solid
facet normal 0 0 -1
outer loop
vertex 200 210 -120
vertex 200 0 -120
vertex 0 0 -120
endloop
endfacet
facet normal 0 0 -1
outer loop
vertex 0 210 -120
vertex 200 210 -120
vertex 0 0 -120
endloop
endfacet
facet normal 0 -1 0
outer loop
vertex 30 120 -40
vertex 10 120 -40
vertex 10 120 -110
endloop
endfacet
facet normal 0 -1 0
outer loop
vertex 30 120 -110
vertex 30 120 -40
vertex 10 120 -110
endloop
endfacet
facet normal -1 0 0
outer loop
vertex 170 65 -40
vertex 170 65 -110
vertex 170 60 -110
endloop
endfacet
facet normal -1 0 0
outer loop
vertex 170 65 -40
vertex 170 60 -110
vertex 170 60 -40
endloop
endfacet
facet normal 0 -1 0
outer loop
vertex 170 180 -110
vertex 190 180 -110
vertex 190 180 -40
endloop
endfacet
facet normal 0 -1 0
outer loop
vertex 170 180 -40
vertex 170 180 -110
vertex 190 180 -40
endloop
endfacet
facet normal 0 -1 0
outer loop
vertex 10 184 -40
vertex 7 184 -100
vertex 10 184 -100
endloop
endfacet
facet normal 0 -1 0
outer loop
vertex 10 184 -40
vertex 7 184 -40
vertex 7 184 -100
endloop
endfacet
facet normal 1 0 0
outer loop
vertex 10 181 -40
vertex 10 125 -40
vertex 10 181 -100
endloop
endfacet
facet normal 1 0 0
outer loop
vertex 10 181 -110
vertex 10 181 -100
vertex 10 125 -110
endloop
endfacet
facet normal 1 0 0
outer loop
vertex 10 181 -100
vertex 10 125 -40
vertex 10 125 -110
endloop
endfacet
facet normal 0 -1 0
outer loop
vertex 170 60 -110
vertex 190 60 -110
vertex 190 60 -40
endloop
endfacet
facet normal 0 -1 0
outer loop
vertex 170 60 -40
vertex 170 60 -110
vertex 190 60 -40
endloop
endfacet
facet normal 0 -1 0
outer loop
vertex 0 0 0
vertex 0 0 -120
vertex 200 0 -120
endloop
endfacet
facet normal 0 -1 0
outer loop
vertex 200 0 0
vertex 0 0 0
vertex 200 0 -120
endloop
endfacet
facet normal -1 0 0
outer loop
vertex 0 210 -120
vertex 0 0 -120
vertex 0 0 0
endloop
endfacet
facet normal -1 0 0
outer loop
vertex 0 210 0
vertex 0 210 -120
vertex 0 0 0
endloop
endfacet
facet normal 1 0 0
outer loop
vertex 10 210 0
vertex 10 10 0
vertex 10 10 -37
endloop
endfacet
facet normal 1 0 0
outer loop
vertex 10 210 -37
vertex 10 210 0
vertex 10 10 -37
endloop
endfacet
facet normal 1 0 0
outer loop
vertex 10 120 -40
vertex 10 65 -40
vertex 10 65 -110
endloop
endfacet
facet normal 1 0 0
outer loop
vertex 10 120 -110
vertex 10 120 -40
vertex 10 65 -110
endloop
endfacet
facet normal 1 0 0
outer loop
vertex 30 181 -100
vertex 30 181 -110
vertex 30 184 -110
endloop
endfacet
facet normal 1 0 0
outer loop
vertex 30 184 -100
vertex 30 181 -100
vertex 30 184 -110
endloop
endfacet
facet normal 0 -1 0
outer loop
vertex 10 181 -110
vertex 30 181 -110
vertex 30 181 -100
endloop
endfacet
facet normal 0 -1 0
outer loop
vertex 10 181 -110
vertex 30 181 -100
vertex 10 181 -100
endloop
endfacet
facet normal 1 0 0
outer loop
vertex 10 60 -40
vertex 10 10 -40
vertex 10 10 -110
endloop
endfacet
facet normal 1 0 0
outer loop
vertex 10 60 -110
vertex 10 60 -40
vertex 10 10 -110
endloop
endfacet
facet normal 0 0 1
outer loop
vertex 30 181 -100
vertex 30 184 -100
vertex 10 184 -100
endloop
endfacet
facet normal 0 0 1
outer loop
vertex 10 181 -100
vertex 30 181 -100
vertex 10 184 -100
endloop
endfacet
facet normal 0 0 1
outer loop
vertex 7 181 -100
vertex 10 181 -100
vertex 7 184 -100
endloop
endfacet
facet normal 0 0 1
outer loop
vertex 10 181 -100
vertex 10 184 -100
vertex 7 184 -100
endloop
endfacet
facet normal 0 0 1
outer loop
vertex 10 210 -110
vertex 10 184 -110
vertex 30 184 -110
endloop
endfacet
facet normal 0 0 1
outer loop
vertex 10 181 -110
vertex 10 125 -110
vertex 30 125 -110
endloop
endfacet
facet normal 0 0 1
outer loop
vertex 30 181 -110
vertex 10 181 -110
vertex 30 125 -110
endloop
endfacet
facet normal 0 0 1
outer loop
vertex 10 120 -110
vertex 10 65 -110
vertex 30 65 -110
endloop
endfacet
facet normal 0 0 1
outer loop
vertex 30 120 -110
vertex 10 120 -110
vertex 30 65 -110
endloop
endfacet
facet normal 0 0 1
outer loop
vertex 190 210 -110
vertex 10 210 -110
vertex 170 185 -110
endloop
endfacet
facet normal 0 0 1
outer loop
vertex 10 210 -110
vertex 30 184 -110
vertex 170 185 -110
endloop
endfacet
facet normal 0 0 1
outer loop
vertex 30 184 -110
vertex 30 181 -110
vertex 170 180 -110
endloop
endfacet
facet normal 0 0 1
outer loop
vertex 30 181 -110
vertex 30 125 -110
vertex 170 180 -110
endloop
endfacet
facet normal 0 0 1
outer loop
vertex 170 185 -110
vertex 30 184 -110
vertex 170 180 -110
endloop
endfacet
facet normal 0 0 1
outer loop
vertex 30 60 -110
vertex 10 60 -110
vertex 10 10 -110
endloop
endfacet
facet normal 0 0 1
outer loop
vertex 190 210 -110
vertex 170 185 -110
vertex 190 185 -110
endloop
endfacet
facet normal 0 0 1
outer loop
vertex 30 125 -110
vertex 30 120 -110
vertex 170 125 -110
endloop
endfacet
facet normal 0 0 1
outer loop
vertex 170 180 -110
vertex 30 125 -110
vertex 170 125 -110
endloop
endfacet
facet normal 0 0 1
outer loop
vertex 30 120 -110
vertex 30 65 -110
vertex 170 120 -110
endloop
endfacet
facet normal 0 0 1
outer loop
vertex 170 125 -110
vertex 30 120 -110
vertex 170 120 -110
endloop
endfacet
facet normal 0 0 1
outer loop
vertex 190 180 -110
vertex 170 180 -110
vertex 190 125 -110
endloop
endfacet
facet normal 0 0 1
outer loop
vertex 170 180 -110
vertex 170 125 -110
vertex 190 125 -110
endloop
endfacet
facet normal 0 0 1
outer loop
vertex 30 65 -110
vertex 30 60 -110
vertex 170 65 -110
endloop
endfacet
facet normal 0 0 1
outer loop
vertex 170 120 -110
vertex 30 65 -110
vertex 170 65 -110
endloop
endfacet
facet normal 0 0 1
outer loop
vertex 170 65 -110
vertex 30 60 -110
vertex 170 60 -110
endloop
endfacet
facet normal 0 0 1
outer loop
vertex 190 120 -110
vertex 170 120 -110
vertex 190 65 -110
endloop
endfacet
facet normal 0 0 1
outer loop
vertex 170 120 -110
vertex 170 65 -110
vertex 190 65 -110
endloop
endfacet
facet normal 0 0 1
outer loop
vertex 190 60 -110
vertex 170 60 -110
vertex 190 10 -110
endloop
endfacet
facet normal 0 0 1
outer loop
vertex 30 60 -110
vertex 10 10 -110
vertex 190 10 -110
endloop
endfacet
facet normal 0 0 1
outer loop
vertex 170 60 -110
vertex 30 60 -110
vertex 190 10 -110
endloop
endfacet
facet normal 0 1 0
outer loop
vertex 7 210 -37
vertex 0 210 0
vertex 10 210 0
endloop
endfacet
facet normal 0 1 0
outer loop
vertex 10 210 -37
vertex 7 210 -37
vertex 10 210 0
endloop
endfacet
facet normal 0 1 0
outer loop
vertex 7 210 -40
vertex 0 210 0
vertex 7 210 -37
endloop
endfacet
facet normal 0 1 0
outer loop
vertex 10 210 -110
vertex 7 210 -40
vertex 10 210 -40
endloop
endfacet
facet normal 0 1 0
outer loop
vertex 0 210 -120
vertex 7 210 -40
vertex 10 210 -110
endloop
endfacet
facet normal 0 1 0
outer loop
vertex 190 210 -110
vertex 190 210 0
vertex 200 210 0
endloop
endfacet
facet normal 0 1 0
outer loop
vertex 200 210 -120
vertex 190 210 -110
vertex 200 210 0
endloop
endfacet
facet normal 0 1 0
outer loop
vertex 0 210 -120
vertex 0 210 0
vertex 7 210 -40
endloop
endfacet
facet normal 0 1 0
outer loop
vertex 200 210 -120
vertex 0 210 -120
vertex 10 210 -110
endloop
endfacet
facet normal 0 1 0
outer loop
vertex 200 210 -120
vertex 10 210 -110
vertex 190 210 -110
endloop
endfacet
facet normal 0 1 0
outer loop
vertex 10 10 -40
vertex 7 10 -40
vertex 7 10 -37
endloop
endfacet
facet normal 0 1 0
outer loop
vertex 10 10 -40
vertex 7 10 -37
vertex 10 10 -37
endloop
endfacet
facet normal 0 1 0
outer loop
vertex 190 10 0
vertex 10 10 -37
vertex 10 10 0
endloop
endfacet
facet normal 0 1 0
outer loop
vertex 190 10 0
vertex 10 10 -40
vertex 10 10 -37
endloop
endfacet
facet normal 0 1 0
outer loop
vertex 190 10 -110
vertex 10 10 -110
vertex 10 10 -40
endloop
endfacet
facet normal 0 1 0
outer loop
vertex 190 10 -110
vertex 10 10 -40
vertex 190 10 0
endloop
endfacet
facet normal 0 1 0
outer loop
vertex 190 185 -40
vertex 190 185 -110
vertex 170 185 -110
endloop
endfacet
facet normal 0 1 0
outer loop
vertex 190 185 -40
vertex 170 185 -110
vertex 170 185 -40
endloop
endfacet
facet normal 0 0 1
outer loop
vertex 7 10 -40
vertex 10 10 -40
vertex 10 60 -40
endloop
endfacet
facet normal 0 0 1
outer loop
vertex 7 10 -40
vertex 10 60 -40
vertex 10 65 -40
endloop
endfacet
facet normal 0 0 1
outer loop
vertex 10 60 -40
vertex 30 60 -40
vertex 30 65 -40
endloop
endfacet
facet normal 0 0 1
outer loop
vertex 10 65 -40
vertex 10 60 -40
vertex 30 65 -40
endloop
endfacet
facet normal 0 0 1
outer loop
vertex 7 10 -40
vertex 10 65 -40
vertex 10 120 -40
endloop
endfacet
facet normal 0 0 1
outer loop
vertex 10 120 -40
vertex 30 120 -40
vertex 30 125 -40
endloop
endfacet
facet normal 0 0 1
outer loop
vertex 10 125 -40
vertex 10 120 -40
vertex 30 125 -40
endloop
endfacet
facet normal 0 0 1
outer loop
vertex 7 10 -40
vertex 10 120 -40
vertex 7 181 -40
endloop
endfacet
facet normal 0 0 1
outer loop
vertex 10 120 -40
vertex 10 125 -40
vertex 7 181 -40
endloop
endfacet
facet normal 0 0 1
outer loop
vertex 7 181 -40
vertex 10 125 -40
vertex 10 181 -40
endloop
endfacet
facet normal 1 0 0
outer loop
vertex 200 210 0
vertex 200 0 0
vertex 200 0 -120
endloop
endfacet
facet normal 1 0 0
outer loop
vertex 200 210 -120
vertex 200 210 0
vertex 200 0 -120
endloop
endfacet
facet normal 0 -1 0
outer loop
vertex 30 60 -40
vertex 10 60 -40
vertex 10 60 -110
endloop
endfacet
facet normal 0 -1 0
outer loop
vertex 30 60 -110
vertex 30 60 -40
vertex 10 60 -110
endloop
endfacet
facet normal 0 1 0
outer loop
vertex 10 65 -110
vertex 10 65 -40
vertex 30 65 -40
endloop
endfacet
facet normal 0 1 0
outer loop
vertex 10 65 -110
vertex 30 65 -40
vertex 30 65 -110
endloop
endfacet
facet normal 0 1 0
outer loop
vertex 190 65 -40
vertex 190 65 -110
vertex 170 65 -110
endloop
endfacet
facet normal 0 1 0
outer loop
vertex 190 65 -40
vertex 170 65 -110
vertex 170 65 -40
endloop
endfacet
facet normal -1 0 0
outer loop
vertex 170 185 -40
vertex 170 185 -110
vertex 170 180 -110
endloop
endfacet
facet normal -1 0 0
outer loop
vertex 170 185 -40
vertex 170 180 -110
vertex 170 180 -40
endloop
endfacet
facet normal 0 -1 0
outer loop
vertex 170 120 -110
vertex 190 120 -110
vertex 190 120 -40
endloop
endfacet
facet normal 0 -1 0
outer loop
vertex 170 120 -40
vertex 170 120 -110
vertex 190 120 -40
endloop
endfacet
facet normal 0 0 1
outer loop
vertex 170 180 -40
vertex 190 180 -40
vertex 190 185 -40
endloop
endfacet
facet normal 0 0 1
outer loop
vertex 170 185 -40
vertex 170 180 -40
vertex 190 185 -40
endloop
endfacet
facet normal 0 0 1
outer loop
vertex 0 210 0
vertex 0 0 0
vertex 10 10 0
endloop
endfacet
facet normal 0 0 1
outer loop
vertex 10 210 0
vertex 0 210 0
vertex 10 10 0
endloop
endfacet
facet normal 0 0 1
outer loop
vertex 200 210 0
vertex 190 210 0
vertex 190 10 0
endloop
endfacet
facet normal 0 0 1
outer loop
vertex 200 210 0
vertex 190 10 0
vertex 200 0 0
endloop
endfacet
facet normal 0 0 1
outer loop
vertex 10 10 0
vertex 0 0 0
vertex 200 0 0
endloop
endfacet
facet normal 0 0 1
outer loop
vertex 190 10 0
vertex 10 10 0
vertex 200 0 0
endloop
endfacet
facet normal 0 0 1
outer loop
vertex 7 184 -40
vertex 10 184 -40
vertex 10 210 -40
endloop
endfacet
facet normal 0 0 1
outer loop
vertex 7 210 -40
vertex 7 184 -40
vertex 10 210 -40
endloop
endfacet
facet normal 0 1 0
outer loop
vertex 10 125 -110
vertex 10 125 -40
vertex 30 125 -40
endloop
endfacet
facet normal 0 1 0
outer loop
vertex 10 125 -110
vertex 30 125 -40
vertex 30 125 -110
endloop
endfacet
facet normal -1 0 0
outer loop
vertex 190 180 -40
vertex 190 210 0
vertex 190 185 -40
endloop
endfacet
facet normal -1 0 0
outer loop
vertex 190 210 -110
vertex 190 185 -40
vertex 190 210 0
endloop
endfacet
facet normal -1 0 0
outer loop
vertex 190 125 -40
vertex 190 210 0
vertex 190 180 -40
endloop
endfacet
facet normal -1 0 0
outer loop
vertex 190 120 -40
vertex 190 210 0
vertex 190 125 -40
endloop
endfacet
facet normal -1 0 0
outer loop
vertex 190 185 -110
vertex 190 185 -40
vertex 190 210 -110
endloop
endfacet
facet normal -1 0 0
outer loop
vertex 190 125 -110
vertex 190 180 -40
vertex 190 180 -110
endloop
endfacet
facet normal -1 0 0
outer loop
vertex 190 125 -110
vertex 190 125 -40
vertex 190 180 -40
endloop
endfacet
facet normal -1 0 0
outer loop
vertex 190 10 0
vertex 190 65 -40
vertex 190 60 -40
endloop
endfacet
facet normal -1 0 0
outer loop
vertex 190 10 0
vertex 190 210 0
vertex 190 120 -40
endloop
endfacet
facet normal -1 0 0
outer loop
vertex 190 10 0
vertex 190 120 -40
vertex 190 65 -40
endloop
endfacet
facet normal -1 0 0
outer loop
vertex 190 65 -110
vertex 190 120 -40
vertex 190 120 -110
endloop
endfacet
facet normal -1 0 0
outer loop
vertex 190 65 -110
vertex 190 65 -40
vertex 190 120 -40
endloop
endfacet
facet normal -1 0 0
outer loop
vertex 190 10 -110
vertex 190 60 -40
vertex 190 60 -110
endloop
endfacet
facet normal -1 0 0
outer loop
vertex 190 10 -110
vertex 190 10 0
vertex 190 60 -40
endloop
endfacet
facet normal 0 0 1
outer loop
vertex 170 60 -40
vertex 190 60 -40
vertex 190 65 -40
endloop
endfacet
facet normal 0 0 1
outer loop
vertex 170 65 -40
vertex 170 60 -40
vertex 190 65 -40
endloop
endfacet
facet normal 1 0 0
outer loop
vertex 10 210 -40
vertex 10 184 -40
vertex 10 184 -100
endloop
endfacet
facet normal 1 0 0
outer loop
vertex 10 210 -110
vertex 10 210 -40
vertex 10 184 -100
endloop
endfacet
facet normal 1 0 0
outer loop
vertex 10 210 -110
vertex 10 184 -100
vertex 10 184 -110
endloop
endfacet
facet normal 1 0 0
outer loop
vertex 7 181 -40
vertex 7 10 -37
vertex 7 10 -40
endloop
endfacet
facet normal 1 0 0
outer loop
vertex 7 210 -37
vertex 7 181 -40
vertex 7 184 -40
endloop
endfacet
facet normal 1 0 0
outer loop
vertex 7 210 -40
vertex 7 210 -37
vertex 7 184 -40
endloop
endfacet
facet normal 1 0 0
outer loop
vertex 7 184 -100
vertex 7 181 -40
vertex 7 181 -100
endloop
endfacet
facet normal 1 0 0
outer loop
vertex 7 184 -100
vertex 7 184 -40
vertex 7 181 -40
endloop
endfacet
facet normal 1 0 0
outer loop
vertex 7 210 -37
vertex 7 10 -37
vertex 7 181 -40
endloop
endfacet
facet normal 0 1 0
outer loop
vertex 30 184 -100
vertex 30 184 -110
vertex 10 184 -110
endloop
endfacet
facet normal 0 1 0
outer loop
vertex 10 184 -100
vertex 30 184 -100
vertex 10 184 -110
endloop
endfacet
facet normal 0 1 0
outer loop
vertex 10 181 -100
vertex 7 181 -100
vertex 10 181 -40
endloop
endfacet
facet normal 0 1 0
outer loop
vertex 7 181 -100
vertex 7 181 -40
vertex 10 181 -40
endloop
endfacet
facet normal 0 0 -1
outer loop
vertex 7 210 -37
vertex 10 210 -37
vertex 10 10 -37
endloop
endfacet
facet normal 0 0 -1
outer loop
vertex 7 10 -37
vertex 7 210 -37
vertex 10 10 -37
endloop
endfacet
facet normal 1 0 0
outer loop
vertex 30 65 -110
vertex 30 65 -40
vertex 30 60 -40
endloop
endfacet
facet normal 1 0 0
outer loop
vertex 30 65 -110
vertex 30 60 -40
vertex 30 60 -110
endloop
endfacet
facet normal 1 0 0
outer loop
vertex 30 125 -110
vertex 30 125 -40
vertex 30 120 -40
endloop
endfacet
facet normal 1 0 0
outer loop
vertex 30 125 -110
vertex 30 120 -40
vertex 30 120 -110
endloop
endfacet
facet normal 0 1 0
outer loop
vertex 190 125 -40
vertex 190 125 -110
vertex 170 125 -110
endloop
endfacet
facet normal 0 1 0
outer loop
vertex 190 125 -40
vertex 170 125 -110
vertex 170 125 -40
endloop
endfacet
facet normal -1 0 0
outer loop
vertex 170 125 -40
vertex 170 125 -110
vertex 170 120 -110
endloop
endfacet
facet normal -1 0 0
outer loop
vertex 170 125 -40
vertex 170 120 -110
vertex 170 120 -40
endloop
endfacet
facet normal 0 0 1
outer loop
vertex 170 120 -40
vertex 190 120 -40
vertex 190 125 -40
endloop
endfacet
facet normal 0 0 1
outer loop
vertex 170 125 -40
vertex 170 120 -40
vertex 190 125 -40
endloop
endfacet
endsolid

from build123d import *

# Parameters (mm, degrees)
SKETCH1_W           = 200
SKETCH1_H           = 120
BOSS_EXTRUDE2_DEPTH = 10
SKETCH2_W           = 10
SKETCH2_H           = 110
BOSS_EXTRUDE3_DEPTH = 200
SKETCH3_W           = 70
SKETCH3_H           = 5
BOSS_EXTRUDE4_DEPTH = 20
SKETCH4_W           = 70
SKETCH4_H           = 5
BOSS_EXTRUDE5_DEPTH = 20
SKETCH6_W           = 20
SKETCH6_H           = 3
CUT_EXTRUDE1_DEPTH  = 80
CUT_EXTRUDE2_DEPTH  = 3
SKETCH9_W           = 80
SKETCH9_H           = 3
CUT_EXTRUDE5_DEPTH  = 3
SKETCH10_W          = 20
SKETCH10_H          = 1
CUT_EXTRUDE6_DEPTH  = 70
SKETCH11_W          = 23
SKETCH11_H          = 3
BOSS_EXTRUDE6_DEPTH = 20


with BuildPart() as part:
    # Sketch1 → Boss-Extrude2 (new body)
    with BuildSketch(Plane(origin=(0, 0, 0), x_dir=(1, 0, 0), z_dir=(0, 1, 0))):
        with Locations((100, 60)):
            Rectangle(SKETCH1_W, SKETCH1_H)
    extrude(amount=BOSS_EXTRUDE2_DEPTH)

    # Sketch2 → Boss-Extrude3 (add)
    with BuildSketch(Plane(origin=(0, 10, 0), x_dir=(1, 0, 0), z_dir=(0, 1, 0))):
        with Locations((5, 55)):
            Rectangle(SKETCH2_W, SKETCH2_H)
        Polygon((200, 120), (0, 120), (0, 110), (10, 110), (190, 110), (200, 110), align=None)
        with Locations((195, 55)):
            Rectangle(SKETCH2_W, SKETCH2_H)
    extrude(amount=BOSS_EXTRUDE3_DEPTH)

    # Sketch3 → Boss-Extrude4 (add)
    with BuildSketch(Plane(origin=(10, 0, 0), x_dir=(0, 0, -1), z_dir=(1, 0, 0))):
        with Locations((75, 182.5)):
            Rectangle(SKETCH3_W, SKETCH3_H)
        with Locations((75, 122.5)):
            Rectangle(SKETCH3_W, SKETCH3_H)
        with Locations((75, 62.5)):
            Rectangle(SKETCH3_W, SKETCH3_H)
    extrude(amount=BOSS_EXTRUDE4_DEPTH)

    # Sketch4 → Boss-Extrude5 (add)
    with BuildSketch(Plane.ZY.offset(-190)):
        with Locations((-75, 182.5)):
            Rectangle(SKETCH4_W, SKETCH4_H)
        with Locations((-75, 122.5)):
            Rectangle(SKETCH4_W, SKETCH4_H)
        with Locations((-75, 62.5)):
            Rectangle(SKETCH4_W, SKETCH4_H)
    extrude(amount=BOSS_EXTRUDE5_DEPTH)

    # Sketch6 → Cut-Extrude1 (cut)
    with BuildSketch(Plane.XY.offset(-40)):
        with Locations((20, 182.5)):
            Rectangle(SKETCH6_W, SKETCH6_H)
    extrude(amount=-CUT_EXTRUDE1_DEPTH, mode=Mode.SUBTRACT)

    # Sketch7 → Cut-Extrude2 (cut)
    with BuildSketch(Plane(origin=(10, 0, 0), x_dir=(0, 0, -1), z_dir=(1, 0, 0))):
        Polygon((40, 185), (40, 210), (37, 210), (37, 10), (40, 10), align=None)
    extrude(amount=-CUT_EXTRUDE2_DEPTH, mode=Mode.SUBTRACT)

    # Sketch9 → Cut-Extrude5 (cut)
    with BuildSketch(Plane(origin=(10, 0, 0), x_dir=(0, 0, -1), z_dir=(1, 0, 0))):
        with Locations((80, 182.5)):
            Rectangle(SKETCH9_W, SKETCH9_H)
    extrude(amount=-CUT_EXTRUDE5_DEPTH, mode=Mode.SUBTRACT)

    # Sketch10 → Cut-Extrude6 (cut)
    with BuildSketch(Plane.XY.offset(-40)):
        with Locations((20, 184.5)):
            Rectangle(SKETCH10_W, SKETCH10_H)
        with Locations((20, 180.5)):
            Rectangle(SKETCH10_W, SKETCH10_H)
    extrude(amount=-CUT_EXTRUDE6_DEPTH, mode=Mode.SUBTRACT)

    # Sketch11 → Boss-Extrude6 (add)
    with BuildSketch(Plane(origin=(0, 0, -120), x_dir=(-1, 0, 0), z_dir=(0, 0, -1))):
        with Locations((-18.5, 182.5)):
            Rectangle(SKETCH11_W, SKETCH11_H)
    extrude(amount=-BOSS_EXTRUDE6_DEPTH)


solid = part.part
